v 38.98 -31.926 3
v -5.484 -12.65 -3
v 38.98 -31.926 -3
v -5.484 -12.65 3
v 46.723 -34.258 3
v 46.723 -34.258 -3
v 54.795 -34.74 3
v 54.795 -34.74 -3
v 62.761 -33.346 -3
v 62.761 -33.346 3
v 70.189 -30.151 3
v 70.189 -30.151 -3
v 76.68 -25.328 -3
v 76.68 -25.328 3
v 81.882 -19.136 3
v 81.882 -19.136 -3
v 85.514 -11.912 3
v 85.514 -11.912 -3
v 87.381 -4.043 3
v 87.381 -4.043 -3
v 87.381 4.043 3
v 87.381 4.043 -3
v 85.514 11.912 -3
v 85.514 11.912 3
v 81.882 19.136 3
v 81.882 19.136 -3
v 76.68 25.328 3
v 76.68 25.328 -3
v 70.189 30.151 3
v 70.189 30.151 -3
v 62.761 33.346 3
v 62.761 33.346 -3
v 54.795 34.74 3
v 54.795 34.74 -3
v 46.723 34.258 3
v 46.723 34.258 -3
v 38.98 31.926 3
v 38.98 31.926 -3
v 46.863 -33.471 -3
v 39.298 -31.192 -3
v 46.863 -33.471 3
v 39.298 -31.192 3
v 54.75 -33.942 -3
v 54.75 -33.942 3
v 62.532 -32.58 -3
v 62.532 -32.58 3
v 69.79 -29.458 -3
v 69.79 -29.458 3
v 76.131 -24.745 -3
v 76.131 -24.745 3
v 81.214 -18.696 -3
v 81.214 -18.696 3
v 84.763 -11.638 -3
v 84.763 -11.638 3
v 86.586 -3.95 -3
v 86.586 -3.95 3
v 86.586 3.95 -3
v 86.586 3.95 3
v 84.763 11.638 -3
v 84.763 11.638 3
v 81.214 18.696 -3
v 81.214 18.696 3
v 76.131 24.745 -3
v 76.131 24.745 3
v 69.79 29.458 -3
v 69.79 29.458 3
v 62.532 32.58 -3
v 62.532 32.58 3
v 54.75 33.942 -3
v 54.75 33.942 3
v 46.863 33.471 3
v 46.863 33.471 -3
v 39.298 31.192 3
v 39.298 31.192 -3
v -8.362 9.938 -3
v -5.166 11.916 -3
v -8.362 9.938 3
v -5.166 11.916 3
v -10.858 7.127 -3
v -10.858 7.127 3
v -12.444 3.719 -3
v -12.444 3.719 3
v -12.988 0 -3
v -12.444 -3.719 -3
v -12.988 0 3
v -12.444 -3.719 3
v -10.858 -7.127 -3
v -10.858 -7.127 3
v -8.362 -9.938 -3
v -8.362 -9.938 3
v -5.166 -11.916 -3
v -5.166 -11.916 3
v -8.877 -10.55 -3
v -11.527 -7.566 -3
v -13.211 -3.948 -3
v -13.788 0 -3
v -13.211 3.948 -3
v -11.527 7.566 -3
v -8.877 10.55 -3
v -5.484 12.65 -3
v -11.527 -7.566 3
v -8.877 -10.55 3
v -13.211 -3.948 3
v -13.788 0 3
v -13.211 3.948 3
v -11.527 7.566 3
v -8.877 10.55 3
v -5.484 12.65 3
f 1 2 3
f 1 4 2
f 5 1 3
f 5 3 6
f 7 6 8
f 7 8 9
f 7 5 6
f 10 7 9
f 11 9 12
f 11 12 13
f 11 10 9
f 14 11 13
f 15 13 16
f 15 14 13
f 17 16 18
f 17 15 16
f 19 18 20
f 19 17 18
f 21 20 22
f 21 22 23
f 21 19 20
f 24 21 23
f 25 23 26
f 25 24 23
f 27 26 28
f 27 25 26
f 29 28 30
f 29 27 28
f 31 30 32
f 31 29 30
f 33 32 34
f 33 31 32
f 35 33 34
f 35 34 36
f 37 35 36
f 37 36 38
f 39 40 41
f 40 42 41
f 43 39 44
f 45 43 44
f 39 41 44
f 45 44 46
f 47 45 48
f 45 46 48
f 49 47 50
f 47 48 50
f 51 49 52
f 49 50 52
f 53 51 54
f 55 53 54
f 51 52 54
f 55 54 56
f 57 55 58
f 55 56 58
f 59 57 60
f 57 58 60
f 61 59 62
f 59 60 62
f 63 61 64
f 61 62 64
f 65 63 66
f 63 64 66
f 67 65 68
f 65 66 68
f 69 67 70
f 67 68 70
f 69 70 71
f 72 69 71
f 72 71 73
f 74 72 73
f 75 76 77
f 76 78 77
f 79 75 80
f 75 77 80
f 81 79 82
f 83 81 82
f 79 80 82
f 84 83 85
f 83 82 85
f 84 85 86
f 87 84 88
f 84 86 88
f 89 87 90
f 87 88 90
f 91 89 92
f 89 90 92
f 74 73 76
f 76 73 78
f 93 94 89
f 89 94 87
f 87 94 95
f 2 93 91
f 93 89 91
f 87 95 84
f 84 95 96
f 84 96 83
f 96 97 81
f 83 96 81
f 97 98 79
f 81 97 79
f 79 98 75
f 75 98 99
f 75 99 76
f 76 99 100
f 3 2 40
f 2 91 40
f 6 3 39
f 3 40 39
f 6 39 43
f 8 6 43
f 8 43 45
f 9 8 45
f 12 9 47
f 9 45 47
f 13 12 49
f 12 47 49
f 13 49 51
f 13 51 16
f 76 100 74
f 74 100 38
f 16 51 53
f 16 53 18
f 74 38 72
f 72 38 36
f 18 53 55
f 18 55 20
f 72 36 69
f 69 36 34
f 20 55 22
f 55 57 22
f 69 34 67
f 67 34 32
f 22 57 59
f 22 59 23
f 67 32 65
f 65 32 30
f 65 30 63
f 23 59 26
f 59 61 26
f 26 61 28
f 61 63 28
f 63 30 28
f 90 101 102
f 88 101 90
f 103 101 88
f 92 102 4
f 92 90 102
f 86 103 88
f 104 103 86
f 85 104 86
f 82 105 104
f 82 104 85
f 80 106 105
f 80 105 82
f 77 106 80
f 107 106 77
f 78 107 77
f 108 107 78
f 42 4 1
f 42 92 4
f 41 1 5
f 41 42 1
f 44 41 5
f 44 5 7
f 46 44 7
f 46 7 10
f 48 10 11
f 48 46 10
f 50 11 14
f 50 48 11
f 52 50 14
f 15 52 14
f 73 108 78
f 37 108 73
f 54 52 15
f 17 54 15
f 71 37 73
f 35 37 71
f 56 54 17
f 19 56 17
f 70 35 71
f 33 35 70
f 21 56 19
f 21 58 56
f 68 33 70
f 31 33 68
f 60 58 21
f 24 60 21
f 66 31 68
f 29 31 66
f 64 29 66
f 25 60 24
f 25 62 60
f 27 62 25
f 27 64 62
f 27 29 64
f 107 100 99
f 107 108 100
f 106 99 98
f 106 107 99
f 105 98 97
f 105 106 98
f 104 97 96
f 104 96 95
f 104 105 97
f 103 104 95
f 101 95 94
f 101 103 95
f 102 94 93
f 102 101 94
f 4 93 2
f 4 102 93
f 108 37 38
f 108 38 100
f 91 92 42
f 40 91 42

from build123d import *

# Parameters (mm, degrees)
EXTRUDE_1_DEPTH      = 3
EXTRUDE_1_DEPTH_BACK = 3


with BuildPart() as part:
    # Sketch 1 → Extrude 1 (new body, two sides)
    with BuildSketch(Plane.XY) as extrude_1_sk:
        with BuildLine():
            Line((-5.483999587, -12.650498258), (38.980167841, -31.925745039))
            ThreePointArc((38.980167841, -31.925745039), (87.6164675, 0), (38.980167841, 31.925745039))
            Line((38.980167841, 31.925745039), (-5.483999587, 12.650498258))
            ThreePointArc((-5.483999587, 12.650498258), (-13.788015, 0), (-5.483999587, -12.650498258))
        make_face()
        with BuildLine():
            Line((-5.165810227, -11.916498577), (39.298357201, -31.191745358))
            ThreePointArc((39.298357201, -31.191745358), (86.8164675, 0), (39.298357201, 31.191745358))
            Line((39.298357201, 31.191745358), (-5.165810227, 11.916498577))
            ThreePointArc((-5.165810227, 11.916498577), (-12.988015, 0), (-5.165810227, -11.916498577))
        make_face(mode=Mode.SUBTRACT)
    extrude(amount=EXTRUDE_1_DEPTH)
    extrude(extrude_1_sk.sketch, amount=-EXTRUDE_1_DEPTH_BACK)


solid = part.part
